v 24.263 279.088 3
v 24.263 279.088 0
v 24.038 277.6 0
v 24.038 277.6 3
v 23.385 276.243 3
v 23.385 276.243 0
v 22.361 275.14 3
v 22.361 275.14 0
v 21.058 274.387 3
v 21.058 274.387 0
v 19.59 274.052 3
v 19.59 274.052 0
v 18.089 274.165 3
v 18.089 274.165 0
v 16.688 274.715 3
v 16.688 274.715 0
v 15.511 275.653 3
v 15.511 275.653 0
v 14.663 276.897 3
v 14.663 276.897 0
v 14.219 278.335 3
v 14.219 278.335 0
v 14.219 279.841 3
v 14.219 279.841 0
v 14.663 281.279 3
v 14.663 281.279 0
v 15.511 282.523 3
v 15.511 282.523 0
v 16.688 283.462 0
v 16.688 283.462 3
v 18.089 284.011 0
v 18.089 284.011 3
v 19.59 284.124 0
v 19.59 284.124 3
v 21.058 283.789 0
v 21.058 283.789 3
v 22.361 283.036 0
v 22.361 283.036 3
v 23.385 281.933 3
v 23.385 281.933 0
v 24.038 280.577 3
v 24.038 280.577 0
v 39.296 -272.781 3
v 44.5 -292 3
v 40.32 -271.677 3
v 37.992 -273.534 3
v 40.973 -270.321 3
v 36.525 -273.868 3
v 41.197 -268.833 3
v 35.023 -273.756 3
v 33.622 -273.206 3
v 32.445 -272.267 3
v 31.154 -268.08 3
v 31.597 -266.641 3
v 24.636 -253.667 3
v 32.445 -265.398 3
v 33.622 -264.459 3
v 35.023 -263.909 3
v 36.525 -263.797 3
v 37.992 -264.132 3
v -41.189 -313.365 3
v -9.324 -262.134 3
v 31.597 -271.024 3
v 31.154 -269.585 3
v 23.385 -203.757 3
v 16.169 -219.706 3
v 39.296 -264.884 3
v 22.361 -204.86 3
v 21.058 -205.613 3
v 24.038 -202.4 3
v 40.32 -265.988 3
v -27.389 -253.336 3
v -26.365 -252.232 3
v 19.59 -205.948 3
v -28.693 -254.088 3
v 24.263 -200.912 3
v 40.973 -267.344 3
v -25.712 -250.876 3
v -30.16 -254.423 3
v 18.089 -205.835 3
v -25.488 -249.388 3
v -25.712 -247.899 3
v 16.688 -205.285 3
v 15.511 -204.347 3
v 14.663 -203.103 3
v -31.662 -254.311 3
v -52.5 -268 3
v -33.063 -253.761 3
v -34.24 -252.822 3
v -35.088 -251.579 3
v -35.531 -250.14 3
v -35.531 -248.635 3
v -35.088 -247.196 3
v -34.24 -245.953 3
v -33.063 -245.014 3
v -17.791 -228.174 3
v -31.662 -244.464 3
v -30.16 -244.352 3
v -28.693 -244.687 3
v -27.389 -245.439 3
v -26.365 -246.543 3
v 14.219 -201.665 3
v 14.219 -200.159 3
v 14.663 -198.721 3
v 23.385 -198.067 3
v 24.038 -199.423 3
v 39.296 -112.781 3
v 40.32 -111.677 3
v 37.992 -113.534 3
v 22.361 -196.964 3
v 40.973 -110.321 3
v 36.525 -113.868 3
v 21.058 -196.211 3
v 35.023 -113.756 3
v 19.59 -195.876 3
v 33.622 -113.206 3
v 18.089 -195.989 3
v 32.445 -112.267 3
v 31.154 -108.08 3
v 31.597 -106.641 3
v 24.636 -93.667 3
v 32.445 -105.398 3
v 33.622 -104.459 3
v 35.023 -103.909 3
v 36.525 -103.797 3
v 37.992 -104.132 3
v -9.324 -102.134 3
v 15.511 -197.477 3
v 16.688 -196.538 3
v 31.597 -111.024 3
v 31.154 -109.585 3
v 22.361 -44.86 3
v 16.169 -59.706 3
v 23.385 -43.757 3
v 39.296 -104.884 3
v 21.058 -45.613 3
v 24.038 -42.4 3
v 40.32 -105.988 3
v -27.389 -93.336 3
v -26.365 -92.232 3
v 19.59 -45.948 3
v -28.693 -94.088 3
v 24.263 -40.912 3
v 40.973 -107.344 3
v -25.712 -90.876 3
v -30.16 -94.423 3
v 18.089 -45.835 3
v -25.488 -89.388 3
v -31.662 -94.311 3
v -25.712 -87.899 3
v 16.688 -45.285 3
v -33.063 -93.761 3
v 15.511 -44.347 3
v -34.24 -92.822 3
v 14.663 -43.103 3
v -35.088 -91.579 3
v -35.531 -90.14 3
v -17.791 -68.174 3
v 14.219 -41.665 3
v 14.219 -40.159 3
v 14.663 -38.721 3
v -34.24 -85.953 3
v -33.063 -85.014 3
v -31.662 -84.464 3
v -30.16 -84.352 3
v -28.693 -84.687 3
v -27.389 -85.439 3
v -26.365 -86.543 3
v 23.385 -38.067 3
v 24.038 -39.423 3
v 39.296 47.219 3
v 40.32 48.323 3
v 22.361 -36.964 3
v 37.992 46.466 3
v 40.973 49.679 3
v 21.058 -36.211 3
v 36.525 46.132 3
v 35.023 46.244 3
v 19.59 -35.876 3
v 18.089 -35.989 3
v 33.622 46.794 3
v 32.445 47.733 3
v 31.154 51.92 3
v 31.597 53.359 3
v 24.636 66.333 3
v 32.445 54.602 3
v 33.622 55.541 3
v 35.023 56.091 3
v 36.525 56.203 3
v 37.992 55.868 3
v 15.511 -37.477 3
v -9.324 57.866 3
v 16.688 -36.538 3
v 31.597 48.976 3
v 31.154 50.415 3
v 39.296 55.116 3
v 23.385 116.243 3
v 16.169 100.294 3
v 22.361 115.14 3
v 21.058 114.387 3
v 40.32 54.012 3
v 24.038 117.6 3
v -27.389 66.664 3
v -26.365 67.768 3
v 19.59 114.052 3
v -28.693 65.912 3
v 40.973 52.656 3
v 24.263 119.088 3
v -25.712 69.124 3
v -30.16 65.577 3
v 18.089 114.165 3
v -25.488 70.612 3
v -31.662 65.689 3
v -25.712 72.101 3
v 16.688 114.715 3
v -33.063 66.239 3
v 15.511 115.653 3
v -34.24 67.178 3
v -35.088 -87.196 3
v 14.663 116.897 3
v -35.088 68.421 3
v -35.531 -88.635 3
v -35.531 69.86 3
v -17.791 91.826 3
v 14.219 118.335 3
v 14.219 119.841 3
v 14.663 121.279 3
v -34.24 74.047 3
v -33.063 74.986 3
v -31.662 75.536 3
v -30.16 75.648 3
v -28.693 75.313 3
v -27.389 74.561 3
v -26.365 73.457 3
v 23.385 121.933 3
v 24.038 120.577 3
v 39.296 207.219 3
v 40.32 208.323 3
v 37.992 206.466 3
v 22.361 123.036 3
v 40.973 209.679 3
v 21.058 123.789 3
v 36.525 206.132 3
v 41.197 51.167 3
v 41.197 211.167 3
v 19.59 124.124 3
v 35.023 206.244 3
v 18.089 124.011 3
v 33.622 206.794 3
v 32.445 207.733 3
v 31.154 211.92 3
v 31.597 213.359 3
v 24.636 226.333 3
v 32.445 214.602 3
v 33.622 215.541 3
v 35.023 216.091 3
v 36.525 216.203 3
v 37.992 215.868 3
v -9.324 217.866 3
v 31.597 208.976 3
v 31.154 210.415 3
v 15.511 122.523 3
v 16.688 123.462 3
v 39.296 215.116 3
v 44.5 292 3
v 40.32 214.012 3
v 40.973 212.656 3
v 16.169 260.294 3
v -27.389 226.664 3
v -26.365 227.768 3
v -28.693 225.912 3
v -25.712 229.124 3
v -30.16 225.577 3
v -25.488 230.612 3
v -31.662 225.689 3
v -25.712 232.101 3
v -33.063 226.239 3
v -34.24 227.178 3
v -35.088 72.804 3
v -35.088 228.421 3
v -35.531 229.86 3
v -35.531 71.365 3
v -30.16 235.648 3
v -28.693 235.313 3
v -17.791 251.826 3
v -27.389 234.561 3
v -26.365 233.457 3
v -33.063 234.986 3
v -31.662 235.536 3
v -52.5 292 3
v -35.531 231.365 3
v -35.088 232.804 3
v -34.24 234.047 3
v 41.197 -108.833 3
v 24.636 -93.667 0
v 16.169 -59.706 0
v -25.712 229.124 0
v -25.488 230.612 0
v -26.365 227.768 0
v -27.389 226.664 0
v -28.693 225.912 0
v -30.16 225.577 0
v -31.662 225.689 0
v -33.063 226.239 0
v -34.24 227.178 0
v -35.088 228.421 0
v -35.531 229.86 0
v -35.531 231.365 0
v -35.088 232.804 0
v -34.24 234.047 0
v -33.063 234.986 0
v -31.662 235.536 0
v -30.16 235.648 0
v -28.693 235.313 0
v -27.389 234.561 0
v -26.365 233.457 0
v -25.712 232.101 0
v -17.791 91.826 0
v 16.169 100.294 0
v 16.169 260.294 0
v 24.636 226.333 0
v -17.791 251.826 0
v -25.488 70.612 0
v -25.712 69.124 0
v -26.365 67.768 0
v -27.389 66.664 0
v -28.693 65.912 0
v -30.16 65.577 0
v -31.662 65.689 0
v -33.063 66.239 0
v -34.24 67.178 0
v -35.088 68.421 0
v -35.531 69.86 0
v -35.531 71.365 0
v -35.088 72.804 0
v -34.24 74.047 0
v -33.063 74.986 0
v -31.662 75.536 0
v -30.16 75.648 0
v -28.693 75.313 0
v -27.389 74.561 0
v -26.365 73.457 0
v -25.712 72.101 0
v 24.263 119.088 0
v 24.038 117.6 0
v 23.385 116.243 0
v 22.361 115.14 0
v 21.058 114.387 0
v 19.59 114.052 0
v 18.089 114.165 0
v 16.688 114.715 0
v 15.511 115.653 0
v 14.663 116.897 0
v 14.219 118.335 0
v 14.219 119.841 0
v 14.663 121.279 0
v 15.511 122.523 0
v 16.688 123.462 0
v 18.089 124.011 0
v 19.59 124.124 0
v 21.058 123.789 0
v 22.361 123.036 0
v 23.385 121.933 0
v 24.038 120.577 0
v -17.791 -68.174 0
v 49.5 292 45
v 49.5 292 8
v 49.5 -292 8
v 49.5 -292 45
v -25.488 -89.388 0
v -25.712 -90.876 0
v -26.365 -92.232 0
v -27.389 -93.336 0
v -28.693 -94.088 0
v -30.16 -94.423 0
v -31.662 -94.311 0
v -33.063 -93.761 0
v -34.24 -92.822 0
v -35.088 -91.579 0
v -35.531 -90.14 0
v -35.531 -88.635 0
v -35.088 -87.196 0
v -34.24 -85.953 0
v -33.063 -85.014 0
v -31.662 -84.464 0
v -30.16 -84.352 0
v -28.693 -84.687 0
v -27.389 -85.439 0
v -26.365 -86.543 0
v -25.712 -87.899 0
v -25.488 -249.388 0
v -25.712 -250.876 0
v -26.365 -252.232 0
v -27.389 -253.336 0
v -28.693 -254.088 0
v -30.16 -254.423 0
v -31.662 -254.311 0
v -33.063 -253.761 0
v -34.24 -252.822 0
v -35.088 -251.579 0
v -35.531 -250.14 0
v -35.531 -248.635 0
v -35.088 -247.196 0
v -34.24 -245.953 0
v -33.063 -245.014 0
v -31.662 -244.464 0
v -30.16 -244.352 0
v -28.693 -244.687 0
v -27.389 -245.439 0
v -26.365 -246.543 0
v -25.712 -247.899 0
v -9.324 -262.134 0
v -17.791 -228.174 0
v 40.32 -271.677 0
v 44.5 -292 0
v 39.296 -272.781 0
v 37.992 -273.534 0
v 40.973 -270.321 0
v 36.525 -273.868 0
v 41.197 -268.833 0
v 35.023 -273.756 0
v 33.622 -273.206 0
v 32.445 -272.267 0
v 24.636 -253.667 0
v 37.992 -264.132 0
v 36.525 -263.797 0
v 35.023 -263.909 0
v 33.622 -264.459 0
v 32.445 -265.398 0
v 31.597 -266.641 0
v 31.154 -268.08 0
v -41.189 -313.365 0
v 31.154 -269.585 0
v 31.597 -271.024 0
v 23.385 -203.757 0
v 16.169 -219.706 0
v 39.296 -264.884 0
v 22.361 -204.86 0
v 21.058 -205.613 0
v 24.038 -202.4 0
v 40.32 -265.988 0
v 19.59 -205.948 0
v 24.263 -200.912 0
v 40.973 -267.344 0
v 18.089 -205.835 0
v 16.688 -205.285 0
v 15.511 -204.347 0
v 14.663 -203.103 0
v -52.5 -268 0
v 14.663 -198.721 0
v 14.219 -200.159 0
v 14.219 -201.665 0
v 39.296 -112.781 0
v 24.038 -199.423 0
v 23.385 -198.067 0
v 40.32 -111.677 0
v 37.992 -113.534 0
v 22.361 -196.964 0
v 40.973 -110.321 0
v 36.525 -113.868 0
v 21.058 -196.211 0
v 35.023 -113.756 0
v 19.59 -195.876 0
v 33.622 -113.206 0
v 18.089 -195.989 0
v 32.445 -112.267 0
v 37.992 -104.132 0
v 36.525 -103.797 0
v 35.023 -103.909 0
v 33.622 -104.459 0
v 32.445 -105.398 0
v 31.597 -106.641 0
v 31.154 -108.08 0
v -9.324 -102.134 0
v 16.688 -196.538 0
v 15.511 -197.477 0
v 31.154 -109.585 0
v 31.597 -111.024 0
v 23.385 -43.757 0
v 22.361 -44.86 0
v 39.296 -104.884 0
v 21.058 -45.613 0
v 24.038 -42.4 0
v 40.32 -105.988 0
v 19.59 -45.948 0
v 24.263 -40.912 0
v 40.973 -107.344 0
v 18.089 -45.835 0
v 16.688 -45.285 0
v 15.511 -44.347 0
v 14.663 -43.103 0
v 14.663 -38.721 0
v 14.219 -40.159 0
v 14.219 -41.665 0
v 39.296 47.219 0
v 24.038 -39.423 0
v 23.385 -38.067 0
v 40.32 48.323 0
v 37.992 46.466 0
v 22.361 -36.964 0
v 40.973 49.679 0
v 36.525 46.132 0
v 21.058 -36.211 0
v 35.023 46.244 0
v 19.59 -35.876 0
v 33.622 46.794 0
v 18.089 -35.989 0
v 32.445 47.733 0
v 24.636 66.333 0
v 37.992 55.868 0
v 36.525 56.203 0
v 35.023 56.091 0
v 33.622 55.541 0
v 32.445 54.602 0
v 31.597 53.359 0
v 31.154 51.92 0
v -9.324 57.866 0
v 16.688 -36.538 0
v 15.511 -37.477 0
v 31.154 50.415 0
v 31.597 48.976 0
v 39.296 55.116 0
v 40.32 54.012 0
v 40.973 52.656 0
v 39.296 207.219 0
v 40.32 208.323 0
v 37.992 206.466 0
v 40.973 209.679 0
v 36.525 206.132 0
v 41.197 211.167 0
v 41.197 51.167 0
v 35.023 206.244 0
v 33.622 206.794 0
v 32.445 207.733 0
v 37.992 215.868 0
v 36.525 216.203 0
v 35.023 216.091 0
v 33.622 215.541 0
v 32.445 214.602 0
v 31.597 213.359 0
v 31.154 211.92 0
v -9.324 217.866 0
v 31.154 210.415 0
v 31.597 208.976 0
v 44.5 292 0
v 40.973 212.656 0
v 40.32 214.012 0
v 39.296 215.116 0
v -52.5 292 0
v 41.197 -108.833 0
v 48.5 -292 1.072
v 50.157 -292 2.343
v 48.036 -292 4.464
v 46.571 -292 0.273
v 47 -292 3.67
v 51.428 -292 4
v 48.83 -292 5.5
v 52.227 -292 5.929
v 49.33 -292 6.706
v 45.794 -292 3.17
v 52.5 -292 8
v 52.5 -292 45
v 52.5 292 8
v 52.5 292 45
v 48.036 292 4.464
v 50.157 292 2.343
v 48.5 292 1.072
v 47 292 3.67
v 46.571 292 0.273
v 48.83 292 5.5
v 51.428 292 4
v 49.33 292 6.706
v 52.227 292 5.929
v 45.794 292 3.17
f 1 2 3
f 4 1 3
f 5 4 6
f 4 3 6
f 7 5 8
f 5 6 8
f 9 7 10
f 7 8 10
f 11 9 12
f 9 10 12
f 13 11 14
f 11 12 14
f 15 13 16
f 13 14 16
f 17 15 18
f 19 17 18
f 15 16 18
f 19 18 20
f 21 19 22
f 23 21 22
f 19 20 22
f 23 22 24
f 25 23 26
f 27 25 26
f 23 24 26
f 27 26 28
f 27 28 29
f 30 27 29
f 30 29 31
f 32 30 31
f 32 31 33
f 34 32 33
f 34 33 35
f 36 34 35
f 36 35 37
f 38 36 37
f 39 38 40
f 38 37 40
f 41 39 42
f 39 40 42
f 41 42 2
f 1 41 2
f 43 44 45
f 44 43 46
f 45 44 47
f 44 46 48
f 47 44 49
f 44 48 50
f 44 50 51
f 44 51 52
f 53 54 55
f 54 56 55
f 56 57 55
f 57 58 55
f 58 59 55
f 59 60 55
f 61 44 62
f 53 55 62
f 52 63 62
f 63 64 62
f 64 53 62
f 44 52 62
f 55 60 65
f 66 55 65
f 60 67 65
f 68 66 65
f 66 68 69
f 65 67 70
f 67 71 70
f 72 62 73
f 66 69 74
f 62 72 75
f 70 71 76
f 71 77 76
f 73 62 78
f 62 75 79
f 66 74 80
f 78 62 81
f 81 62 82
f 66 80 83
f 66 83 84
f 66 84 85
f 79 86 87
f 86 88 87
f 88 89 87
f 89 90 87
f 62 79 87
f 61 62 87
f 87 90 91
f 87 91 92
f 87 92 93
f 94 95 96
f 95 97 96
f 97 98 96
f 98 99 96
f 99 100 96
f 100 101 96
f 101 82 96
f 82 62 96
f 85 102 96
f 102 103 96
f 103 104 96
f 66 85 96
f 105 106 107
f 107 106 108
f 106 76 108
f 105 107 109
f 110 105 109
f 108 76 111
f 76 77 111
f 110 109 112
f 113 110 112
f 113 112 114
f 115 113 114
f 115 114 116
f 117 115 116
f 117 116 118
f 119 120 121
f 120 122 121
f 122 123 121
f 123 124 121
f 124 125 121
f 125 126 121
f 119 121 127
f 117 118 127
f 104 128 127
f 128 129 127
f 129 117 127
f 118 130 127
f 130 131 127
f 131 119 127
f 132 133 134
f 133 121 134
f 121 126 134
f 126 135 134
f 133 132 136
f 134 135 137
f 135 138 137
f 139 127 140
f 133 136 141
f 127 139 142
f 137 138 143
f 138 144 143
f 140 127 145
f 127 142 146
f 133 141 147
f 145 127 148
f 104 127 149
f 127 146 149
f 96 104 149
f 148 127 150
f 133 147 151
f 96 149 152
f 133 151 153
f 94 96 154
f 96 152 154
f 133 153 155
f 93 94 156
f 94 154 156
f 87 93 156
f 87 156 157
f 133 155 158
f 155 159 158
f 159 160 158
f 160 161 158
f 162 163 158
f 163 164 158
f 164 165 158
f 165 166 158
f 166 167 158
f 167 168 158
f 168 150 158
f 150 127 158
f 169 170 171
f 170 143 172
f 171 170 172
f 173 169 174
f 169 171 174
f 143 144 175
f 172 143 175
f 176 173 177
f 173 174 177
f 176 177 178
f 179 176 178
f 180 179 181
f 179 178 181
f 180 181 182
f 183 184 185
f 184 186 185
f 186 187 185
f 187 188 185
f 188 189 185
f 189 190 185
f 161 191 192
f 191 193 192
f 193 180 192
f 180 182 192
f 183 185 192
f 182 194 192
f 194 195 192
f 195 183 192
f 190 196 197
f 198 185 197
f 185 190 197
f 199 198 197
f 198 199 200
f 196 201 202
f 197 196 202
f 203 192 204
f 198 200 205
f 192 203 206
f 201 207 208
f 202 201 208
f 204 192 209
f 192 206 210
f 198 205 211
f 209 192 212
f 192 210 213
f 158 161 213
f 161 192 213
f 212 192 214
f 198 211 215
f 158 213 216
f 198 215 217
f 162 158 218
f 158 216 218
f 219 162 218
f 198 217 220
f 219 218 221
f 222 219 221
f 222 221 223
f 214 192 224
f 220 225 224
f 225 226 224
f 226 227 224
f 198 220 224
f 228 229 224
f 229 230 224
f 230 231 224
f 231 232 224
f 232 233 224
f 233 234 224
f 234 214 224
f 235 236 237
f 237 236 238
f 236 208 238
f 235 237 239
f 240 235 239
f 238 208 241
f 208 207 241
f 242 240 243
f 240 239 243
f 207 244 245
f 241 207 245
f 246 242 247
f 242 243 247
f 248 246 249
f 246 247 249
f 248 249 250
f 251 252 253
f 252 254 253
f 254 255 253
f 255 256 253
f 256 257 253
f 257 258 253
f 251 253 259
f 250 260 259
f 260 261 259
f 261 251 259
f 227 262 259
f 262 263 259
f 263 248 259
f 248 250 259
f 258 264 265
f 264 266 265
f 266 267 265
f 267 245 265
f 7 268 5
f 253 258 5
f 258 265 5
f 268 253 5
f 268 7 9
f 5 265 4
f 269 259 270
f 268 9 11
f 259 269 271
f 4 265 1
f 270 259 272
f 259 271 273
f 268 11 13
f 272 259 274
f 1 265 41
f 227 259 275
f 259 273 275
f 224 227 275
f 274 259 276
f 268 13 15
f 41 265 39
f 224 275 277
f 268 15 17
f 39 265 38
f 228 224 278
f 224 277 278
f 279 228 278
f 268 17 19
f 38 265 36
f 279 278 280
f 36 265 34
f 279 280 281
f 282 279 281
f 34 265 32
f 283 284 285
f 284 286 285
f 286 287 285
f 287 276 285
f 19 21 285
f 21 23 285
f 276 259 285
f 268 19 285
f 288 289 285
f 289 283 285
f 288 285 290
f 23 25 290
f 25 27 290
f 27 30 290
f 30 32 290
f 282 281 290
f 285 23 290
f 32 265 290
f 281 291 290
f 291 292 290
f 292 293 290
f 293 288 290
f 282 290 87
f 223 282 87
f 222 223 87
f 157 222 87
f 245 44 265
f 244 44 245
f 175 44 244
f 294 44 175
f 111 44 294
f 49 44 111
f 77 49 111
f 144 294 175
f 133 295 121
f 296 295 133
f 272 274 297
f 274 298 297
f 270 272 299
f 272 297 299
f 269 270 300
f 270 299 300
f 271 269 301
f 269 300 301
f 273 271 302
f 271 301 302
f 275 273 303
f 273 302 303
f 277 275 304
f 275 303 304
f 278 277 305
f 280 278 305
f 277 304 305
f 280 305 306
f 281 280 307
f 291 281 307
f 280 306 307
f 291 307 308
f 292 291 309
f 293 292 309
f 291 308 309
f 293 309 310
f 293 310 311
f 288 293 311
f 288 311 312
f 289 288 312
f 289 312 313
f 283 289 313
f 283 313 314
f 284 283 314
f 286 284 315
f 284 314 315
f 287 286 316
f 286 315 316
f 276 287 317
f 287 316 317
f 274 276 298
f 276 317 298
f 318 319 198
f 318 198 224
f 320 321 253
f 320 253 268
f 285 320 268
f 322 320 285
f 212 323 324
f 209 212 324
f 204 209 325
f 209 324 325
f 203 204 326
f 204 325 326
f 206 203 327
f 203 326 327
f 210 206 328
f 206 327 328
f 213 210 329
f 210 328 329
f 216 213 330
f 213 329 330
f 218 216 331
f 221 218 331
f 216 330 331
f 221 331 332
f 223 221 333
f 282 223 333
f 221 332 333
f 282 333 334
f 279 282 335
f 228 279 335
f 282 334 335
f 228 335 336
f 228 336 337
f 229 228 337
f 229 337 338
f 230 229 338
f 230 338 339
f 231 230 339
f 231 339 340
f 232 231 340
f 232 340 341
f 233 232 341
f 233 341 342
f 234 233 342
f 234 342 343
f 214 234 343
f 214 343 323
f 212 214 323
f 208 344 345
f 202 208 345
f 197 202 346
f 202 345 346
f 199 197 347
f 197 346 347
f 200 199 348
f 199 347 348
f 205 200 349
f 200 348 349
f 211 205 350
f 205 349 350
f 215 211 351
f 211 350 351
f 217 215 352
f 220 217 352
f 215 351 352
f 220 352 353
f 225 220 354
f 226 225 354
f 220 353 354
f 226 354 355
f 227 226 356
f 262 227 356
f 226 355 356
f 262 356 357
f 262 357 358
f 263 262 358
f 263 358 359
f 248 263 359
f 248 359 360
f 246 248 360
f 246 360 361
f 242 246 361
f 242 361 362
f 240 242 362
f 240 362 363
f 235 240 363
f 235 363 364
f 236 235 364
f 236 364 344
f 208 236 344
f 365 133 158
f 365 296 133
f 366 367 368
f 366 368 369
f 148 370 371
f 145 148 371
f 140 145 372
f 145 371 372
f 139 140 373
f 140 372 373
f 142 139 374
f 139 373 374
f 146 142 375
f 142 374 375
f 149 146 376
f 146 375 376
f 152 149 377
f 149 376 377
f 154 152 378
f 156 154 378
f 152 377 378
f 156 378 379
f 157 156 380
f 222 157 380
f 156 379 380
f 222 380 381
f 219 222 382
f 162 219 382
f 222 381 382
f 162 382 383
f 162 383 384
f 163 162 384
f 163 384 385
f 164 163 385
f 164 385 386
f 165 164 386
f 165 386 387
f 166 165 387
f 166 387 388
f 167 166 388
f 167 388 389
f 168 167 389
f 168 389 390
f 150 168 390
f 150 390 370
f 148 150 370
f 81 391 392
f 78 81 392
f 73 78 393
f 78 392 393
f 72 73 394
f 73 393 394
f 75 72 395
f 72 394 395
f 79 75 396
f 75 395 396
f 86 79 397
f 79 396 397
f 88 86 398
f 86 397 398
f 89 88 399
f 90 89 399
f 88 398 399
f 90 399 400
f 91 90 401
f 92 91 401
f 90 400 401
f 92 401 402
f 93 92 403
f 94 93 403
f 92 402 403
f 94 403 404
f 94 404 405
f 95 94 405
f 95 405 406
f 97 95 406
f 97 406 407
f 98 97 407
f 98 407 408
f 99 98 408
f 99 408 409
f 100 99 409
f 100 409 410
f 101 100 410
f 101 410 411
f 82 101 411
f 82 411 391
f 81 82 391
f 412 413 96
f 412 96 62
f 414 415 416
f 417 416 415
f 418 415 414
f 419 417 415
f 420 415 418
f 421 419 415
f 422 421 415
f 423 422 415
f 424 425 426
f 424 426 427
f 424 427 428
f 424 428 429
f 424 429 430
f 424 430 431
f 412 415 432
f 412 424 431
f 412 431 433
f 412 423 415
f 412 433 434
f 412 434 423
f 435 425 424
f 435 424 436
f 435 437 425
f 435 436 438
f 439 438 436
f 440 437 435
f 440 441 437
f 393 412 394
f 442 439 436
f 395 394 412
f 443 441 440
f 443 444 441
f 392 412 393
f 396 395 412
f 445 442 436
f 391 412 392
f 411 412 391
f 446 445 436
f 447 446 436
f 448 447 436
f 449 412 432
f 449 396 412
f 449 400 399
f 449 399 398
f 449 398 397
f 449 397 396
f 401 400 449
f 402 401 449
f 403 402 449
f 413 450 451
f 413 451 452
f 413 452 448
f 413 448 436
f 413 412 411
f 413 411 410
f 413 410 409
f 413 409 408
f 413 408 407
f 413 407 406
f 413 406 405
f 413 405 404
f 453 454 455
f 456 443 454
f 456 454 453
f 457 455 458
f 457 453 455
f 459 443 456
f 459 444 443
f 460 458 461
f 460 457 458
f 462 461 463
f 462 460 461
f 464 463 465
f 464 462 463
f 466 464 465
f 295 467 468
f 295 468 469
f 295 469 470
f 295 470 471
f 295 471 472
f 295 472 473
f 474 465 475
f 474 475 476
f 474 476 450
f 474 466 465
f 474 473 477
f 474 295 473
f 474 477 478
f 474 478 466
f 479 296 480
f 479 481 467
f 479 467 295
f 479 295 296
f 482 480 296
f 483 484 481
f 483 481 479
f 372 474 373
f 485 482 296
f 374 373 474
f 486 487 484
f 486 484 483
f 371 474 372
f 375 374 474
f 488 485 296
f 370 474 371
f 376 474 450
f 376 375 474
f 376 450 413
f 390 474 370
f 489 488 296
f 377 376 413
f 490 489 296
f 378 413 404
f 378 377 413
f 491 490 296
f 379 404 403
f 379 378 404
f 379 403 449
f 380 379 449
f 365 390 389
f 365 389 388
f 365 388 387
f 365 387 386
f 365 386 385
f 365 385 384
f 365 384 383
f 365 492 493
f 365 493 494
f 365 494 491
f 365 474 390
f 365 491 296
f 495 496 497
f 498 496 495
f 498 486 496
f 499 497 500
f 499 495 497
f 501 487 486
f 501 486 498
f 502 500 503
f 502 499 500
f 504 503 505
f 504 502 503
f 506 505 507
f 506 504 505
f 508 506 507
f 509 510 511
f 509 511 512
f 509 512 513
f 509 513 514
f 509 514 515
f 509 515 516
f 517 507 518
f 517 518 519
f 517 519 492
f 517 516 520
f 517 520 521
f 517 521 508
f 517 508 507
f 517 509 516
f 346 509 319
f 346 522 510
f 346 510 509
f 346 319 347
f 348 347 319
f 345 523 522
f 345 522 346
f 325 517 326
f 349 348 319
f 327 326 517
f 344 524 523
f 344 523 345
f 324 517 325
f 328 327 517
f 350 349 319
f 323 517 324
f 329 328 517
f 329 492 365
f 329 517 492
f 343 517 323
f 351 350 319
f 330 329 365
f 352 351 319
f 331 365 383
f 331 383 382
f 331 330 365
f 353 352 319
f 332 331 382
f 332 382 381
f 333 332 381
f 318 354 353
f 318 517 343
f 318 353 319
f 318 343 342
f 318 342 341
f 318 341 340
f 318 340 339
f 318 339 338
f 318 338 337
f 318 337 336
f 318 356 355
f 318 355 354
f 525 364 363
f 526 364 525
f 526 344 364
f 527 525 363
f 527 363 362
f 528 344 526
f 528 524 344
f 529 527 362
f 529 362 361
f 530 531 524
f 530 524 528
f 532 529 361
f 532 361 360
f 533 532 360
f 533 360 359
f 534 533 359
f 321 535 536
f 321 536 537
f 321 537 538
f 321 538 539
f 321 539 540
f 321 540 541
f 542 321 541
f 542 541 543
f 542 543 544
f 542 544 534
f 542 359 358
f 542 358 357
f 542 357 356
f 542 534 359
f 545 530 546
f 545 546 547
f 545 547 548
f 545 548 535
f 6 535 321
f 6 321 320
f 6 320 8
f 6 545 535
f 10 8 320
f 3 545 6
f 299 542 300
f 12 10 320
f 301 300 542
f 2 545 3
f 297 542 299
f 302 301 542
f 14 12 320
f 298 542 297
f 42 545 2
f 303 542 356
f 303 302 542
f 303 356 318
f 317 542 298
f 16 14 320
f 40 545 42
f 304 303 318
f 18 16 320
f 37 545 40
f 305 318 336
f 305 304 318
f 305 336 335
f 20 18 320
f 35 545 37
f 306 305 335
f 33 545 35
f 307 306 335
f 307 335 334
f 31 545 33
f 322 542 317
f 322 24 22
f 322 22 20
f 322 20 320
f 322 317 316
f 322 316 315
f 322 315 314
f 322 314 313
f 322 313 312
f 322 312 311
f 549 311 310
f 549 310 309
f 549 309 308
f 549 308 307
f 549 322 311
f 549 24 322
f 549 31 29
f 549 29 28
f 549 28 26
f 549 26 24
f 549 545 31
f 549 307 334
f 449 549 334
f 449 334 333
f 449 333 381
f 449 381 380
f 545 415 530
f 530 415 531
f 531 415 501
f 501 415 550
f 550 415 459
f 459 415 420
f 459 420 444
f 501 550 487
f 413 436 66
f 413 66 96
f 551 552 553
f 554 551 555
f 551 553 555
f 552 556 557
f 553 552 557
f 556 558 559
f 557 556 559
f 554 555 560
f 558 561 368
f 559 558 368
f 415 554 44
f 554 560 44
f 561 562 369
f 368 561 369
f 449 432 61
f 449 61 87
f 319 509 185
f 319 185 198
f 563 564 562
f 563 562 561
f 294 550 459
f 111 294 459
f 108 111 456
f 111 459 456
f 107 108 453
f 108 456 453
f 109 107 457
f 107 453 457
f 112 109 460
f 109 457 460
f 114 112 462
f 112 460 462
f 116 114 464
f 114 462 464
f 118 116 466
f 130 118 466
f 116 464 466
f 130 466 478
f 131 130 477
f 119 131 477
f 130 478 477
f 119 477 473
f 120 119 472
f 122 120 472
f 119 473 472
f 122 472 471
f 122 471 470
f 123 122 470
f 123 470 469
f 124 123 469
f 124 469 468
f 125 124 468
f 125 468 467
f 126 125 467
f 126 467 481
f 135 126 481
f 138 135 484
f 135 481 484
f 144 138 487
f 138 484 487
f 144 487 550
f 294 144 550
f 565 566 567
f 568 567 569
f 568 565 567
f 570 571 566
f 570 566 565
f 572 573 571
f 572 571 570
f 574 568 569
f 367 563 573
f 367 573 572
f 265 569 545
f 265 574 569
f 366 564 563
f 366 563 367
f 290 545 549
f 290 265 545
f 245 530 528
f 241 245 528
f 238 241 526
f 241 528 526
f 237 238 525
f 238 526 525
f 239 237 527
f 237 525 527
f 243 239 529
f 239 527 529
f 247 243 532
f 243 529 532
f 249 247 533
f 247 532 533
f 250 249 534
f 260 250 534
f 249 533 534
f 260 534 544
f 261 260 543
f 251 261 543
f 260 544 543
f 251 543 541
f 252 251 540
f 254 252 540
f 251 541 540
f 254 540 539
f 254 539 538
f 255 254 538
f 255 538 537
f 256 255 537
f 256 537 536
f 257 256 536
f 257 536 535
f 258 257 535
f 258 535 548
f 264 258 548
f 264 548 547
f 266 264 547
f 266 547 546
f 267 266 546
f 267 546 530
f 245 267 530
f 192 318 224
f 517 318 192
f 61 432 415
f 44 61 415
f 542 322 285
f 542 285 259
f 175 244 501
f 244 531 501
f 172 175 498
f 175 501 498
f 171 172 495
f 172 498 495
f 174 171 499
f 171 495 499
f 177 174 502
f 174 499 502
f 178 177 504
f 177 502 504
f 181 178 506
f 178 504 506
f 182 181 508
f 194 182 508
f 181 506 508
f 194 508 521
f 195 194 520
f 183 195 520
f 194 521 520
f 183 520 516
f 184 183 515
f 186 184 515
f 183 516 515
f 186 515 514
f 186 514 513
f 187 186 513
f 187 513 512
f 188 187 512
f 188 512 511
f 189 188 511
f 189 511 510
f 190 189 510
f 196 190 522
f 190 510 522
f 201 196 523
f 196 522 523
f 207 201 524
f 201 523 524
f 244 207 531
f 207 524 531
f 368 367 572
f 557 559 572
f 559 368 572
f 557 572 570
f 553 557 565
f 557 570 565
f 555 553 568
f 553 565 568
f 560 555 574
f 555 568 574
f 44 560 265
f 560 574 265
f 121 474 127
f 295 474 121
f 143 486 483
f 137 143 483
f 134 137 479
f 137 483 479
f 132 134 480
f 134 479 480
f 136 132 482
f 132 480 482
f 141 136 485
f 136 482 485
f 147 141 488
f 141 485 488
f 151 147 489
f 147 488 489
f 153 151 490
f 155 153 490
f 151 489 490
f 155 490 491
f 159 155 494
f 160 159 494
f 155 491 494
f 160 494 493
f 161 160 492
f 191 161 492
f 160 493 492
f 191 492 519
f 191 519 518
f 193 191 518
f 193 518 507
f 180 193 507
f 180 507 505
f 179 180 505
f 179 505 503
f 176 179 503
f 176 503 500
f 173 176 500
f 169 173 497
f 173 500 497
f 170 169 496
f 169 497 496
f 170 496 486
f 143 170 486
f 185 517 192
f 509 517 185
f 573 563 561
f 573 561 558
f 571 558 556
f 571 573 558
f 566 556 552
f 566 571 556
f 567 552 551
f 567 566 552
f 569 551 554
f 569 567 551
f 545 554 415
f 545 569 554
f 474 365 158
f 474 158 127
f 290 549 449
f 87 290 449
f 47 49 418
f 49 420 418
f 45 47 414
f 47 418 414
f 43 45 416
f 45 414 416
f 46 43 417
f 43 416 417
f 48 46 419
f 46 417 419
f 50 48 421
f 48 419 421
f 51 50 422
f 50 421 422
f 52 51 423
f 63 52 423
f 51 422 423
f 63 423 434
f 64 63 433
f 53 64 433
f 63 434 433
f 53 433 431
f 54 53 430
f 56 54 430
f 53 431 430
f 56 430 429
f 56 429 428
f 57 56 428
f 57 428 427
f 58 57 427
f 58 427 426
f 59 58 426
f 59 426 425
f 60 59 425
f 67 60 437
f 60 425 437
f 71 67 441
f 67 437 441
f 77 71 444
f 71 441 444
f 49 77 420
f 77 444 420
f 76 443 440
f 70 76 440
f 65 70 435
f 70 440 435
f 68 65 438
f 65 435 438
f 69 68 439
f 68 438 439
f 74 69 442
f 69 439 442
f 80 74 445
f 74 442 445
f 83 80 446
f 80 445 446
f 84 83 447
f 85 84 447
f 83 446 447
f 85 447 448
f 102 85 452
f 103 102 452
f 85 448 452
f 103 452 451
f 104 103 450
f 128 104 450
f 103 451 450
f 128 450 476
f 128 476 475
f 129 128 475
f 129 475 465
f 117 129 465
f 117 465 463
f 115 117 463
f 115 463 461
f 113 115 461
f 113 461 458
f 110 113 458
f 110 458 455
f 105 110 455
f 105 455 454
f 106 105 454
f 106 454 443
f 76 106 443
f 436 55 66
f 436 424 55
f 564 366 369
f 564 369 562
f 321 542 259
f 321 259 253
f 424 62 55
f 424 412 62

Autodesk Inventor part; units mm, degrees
ref_plane "YZ Plane" through (0, 0, 0) normal (1, 0, 0) x (0, 1, 0)
ref_plane "XZ Plane" through (0, 0, 0) normal (0, 1, 0) x (-1, 0, 0)
ref_plane "XY Plane" through (0, 0, 0) normal (0, 0, 1) x (1, 0, 0)
sketch "Sketch1" plane through (0, 0, 0) normal (0, 0, 1) x (1, 0, 0)
  line L0 (-52.5, 292) -> (52.5, 292)
  line L1 (52.5, 292) -> (52.5, -292)
  line L2 (52.5, -292) -> (-52.5, -292)
  line L3 (-52.5, -292) -> (-52.5, 292)
  line L4 (-52.5, 292) -> (52.5, -292) construction
  point P0 (0, 0)
  point P1 (0, 0)
  dimension "d0" = 105
  dimension "d1" = 584
extrude "Plate1" add sketch "Sketch1" along normal blind 3
sketch "Sketch4" plane through (49.5, 292, 0) normal (1, 0, 0) x (0, 1, 0)
  line L0 (-584, 0) -> (0, 0)
  line L1 (0, 0) -> (0, 45)
  line L2 (0, 45) -> (-584, 45)
  line L3 (-584, 45) -> (-584, 0)
edge flange "Flange1" height 45 angle 90 thickness 3 bend radius 5 thickness toward (1, 0, 0) relief round relief width 3 relief depth 1.5 edges at (52.5, 0, 3) wall of the first edge with corners at (49.5, -292, 0) (49.5, 292, 0) (49.5, 292, 45) (49.5, -292, 45)
bend "Bend1"
corner "Corner1"
sketch "Sketch5" plane through (0, 0, 0) normal (0, 0, -1) x (-1, 0, 0)
  line L0 (-44.5, 292) -> (-44.5, -292) projected
  line L1 (52.5, -292) -> (-44.5, -292) projected
  line L2 (52.5, 292) -> (52.5, -292) projected
  line L3 (-44.5, 292) -> (52.5, 292) projected
  line L4 (52.5, -292) -> (52.5, -316.1848)
  line L5 (-44.5, -292) -> (52.5, -292) projected
  line L6 (52.5, -316.1848) -> (-44.5, -292)
  point P0 (0, 0)
  dimension "d25" = 14
extrude "Extrusion2" add sketch "Sketch5" against normal up to surface (3 mm away) contours L1 L4 L6
sketch "Sketch6" plane through (0, 0, 0) normal (0, 0, -1) x (-1, 0, 0)
  line L0 (-44.5, 292) -> (-44.5, -292) construction
  line L1 (-44.5, -292) -> (52.5, -316.1848) projected
  line L2 (52.5, 292) -> (52.5, -316.1848) projected
  line L3 (-44.5, 292) -> (52.5, 292) construction
  line L4 (41.1893, -313.3647) -> (52.5, -268)
  line L5 (-44.5, -292) -> (52.5, -316.1848) projected
  point P0 (0, 0)
  dimension "d45" = 560
extrude "Cut1" cut sketch "Sketch6" against normal blind 3
sketch "Sketch7" plane through (0, 0, 0) normal (0, 0, 1) x (1, 0, 0)
  line L0 (44.5, -292) -> (-41.1893, -313.3647) projected
  circle A0 centre (36.1472, -268.8326) radius 5.05
  line L1 (36.1472, -268.8326) -> (19.2126, -200.9119) construction
  line L2 (24.6363, -253.6668) -> (16.1691, -219.7064)
  circle A1 centre (19.2126, -200.9119) radius 5.05
  line L3 (-30.5378, -249.3875) -> (36.1472, -268.8326) construction
  line L4 (24.6363, -253.6668) -> (-17.7913, -228.1737) construction
  line L5 (16.1691, -219.7064) -> (-17.7913, -228.1737)
  line L6 (-9.324, -262.1341) -> (24.6363, -253.6668)
  line L7 (16.1691, -219.7064) -> (-9.324, -262.1341) construction
  line L8 (-17.7913, -228.1737) -> (-9.324, -262.1341)
  line L9 (20.4027, -236.6866) -> (-30.5378, -249.3875) construction
  line L10 (19.2126, -200.9119) -> (-30.5378, -249.3875) construction
  circle A2 centre (-30.5378, -249.3875) radius 5.05
  point P0 (0, 0)
  point P1 (3.4225, -240.9203)
  dimension "d32" = 35
  dimension "d33" = 35
  dimension "d34" = 10.1
  dimension "d35" = 70
  dimension "d36" = 60
  dimension "d37" = 25
  dimension "d38" = 10
  dimension "d39" = 42
extrude "Extrusion3" cut sketch "Sketch7" along normal through all
pattern_linear "Rectangular Pattern1" count 4 spacing 160 along (0, 1, 0) of "Extrusion3"
equation "\"d0\" = RIDGE_1_hight"
equation "\"d25\" = RIDGE_1_angle"
equation "\"d45\" = RIDGE_1_lenth"
equation "\"d30\" = Thickness"
equation "\"d33\" = d32"
equation "\"d2\" = Thickness"
equation "\"d15\" = BendReliefWidth"
equation "\"d16\" = BendReliefDepth"
equation "\"d17\" = MinimumRemnant"
equation "\"d18\" = TransitionRadius"
equation "\"d21\" = BendRadius"
equation "\"d22\" = CornerReliefSize"
equation "\"d23\" = GapSize"
equation "\"d24\" = JacobiRadiusSize"
equation "\"BendReliefWidth\" = Thickness"
equation "\"BendReliefDepth\" = 0.5 * Thickness"
equation "\"CornerReliefSize\" = 4 * Thickness"
equation "\"MinimumRemnant\" = 2 * Thickness"
equation "\"TransitionRadius\" = BendRadius"
equation "\"JacobiRadiusSize\" = BendRadius"
equation "\"GapSize\" = Thickness"
equation "\"RIDGE_1_hight\" = 105"
equation "\"RIDGE_1_angle\" = 14deg"
equation "\"RIDGE_1_lenth\" = 560"
equation "\"Thickness\" = 3"
equation "\"BendRadius\" = 5"
properties part number "DS-B-103 Ridge top" material "Stainless Steel"
